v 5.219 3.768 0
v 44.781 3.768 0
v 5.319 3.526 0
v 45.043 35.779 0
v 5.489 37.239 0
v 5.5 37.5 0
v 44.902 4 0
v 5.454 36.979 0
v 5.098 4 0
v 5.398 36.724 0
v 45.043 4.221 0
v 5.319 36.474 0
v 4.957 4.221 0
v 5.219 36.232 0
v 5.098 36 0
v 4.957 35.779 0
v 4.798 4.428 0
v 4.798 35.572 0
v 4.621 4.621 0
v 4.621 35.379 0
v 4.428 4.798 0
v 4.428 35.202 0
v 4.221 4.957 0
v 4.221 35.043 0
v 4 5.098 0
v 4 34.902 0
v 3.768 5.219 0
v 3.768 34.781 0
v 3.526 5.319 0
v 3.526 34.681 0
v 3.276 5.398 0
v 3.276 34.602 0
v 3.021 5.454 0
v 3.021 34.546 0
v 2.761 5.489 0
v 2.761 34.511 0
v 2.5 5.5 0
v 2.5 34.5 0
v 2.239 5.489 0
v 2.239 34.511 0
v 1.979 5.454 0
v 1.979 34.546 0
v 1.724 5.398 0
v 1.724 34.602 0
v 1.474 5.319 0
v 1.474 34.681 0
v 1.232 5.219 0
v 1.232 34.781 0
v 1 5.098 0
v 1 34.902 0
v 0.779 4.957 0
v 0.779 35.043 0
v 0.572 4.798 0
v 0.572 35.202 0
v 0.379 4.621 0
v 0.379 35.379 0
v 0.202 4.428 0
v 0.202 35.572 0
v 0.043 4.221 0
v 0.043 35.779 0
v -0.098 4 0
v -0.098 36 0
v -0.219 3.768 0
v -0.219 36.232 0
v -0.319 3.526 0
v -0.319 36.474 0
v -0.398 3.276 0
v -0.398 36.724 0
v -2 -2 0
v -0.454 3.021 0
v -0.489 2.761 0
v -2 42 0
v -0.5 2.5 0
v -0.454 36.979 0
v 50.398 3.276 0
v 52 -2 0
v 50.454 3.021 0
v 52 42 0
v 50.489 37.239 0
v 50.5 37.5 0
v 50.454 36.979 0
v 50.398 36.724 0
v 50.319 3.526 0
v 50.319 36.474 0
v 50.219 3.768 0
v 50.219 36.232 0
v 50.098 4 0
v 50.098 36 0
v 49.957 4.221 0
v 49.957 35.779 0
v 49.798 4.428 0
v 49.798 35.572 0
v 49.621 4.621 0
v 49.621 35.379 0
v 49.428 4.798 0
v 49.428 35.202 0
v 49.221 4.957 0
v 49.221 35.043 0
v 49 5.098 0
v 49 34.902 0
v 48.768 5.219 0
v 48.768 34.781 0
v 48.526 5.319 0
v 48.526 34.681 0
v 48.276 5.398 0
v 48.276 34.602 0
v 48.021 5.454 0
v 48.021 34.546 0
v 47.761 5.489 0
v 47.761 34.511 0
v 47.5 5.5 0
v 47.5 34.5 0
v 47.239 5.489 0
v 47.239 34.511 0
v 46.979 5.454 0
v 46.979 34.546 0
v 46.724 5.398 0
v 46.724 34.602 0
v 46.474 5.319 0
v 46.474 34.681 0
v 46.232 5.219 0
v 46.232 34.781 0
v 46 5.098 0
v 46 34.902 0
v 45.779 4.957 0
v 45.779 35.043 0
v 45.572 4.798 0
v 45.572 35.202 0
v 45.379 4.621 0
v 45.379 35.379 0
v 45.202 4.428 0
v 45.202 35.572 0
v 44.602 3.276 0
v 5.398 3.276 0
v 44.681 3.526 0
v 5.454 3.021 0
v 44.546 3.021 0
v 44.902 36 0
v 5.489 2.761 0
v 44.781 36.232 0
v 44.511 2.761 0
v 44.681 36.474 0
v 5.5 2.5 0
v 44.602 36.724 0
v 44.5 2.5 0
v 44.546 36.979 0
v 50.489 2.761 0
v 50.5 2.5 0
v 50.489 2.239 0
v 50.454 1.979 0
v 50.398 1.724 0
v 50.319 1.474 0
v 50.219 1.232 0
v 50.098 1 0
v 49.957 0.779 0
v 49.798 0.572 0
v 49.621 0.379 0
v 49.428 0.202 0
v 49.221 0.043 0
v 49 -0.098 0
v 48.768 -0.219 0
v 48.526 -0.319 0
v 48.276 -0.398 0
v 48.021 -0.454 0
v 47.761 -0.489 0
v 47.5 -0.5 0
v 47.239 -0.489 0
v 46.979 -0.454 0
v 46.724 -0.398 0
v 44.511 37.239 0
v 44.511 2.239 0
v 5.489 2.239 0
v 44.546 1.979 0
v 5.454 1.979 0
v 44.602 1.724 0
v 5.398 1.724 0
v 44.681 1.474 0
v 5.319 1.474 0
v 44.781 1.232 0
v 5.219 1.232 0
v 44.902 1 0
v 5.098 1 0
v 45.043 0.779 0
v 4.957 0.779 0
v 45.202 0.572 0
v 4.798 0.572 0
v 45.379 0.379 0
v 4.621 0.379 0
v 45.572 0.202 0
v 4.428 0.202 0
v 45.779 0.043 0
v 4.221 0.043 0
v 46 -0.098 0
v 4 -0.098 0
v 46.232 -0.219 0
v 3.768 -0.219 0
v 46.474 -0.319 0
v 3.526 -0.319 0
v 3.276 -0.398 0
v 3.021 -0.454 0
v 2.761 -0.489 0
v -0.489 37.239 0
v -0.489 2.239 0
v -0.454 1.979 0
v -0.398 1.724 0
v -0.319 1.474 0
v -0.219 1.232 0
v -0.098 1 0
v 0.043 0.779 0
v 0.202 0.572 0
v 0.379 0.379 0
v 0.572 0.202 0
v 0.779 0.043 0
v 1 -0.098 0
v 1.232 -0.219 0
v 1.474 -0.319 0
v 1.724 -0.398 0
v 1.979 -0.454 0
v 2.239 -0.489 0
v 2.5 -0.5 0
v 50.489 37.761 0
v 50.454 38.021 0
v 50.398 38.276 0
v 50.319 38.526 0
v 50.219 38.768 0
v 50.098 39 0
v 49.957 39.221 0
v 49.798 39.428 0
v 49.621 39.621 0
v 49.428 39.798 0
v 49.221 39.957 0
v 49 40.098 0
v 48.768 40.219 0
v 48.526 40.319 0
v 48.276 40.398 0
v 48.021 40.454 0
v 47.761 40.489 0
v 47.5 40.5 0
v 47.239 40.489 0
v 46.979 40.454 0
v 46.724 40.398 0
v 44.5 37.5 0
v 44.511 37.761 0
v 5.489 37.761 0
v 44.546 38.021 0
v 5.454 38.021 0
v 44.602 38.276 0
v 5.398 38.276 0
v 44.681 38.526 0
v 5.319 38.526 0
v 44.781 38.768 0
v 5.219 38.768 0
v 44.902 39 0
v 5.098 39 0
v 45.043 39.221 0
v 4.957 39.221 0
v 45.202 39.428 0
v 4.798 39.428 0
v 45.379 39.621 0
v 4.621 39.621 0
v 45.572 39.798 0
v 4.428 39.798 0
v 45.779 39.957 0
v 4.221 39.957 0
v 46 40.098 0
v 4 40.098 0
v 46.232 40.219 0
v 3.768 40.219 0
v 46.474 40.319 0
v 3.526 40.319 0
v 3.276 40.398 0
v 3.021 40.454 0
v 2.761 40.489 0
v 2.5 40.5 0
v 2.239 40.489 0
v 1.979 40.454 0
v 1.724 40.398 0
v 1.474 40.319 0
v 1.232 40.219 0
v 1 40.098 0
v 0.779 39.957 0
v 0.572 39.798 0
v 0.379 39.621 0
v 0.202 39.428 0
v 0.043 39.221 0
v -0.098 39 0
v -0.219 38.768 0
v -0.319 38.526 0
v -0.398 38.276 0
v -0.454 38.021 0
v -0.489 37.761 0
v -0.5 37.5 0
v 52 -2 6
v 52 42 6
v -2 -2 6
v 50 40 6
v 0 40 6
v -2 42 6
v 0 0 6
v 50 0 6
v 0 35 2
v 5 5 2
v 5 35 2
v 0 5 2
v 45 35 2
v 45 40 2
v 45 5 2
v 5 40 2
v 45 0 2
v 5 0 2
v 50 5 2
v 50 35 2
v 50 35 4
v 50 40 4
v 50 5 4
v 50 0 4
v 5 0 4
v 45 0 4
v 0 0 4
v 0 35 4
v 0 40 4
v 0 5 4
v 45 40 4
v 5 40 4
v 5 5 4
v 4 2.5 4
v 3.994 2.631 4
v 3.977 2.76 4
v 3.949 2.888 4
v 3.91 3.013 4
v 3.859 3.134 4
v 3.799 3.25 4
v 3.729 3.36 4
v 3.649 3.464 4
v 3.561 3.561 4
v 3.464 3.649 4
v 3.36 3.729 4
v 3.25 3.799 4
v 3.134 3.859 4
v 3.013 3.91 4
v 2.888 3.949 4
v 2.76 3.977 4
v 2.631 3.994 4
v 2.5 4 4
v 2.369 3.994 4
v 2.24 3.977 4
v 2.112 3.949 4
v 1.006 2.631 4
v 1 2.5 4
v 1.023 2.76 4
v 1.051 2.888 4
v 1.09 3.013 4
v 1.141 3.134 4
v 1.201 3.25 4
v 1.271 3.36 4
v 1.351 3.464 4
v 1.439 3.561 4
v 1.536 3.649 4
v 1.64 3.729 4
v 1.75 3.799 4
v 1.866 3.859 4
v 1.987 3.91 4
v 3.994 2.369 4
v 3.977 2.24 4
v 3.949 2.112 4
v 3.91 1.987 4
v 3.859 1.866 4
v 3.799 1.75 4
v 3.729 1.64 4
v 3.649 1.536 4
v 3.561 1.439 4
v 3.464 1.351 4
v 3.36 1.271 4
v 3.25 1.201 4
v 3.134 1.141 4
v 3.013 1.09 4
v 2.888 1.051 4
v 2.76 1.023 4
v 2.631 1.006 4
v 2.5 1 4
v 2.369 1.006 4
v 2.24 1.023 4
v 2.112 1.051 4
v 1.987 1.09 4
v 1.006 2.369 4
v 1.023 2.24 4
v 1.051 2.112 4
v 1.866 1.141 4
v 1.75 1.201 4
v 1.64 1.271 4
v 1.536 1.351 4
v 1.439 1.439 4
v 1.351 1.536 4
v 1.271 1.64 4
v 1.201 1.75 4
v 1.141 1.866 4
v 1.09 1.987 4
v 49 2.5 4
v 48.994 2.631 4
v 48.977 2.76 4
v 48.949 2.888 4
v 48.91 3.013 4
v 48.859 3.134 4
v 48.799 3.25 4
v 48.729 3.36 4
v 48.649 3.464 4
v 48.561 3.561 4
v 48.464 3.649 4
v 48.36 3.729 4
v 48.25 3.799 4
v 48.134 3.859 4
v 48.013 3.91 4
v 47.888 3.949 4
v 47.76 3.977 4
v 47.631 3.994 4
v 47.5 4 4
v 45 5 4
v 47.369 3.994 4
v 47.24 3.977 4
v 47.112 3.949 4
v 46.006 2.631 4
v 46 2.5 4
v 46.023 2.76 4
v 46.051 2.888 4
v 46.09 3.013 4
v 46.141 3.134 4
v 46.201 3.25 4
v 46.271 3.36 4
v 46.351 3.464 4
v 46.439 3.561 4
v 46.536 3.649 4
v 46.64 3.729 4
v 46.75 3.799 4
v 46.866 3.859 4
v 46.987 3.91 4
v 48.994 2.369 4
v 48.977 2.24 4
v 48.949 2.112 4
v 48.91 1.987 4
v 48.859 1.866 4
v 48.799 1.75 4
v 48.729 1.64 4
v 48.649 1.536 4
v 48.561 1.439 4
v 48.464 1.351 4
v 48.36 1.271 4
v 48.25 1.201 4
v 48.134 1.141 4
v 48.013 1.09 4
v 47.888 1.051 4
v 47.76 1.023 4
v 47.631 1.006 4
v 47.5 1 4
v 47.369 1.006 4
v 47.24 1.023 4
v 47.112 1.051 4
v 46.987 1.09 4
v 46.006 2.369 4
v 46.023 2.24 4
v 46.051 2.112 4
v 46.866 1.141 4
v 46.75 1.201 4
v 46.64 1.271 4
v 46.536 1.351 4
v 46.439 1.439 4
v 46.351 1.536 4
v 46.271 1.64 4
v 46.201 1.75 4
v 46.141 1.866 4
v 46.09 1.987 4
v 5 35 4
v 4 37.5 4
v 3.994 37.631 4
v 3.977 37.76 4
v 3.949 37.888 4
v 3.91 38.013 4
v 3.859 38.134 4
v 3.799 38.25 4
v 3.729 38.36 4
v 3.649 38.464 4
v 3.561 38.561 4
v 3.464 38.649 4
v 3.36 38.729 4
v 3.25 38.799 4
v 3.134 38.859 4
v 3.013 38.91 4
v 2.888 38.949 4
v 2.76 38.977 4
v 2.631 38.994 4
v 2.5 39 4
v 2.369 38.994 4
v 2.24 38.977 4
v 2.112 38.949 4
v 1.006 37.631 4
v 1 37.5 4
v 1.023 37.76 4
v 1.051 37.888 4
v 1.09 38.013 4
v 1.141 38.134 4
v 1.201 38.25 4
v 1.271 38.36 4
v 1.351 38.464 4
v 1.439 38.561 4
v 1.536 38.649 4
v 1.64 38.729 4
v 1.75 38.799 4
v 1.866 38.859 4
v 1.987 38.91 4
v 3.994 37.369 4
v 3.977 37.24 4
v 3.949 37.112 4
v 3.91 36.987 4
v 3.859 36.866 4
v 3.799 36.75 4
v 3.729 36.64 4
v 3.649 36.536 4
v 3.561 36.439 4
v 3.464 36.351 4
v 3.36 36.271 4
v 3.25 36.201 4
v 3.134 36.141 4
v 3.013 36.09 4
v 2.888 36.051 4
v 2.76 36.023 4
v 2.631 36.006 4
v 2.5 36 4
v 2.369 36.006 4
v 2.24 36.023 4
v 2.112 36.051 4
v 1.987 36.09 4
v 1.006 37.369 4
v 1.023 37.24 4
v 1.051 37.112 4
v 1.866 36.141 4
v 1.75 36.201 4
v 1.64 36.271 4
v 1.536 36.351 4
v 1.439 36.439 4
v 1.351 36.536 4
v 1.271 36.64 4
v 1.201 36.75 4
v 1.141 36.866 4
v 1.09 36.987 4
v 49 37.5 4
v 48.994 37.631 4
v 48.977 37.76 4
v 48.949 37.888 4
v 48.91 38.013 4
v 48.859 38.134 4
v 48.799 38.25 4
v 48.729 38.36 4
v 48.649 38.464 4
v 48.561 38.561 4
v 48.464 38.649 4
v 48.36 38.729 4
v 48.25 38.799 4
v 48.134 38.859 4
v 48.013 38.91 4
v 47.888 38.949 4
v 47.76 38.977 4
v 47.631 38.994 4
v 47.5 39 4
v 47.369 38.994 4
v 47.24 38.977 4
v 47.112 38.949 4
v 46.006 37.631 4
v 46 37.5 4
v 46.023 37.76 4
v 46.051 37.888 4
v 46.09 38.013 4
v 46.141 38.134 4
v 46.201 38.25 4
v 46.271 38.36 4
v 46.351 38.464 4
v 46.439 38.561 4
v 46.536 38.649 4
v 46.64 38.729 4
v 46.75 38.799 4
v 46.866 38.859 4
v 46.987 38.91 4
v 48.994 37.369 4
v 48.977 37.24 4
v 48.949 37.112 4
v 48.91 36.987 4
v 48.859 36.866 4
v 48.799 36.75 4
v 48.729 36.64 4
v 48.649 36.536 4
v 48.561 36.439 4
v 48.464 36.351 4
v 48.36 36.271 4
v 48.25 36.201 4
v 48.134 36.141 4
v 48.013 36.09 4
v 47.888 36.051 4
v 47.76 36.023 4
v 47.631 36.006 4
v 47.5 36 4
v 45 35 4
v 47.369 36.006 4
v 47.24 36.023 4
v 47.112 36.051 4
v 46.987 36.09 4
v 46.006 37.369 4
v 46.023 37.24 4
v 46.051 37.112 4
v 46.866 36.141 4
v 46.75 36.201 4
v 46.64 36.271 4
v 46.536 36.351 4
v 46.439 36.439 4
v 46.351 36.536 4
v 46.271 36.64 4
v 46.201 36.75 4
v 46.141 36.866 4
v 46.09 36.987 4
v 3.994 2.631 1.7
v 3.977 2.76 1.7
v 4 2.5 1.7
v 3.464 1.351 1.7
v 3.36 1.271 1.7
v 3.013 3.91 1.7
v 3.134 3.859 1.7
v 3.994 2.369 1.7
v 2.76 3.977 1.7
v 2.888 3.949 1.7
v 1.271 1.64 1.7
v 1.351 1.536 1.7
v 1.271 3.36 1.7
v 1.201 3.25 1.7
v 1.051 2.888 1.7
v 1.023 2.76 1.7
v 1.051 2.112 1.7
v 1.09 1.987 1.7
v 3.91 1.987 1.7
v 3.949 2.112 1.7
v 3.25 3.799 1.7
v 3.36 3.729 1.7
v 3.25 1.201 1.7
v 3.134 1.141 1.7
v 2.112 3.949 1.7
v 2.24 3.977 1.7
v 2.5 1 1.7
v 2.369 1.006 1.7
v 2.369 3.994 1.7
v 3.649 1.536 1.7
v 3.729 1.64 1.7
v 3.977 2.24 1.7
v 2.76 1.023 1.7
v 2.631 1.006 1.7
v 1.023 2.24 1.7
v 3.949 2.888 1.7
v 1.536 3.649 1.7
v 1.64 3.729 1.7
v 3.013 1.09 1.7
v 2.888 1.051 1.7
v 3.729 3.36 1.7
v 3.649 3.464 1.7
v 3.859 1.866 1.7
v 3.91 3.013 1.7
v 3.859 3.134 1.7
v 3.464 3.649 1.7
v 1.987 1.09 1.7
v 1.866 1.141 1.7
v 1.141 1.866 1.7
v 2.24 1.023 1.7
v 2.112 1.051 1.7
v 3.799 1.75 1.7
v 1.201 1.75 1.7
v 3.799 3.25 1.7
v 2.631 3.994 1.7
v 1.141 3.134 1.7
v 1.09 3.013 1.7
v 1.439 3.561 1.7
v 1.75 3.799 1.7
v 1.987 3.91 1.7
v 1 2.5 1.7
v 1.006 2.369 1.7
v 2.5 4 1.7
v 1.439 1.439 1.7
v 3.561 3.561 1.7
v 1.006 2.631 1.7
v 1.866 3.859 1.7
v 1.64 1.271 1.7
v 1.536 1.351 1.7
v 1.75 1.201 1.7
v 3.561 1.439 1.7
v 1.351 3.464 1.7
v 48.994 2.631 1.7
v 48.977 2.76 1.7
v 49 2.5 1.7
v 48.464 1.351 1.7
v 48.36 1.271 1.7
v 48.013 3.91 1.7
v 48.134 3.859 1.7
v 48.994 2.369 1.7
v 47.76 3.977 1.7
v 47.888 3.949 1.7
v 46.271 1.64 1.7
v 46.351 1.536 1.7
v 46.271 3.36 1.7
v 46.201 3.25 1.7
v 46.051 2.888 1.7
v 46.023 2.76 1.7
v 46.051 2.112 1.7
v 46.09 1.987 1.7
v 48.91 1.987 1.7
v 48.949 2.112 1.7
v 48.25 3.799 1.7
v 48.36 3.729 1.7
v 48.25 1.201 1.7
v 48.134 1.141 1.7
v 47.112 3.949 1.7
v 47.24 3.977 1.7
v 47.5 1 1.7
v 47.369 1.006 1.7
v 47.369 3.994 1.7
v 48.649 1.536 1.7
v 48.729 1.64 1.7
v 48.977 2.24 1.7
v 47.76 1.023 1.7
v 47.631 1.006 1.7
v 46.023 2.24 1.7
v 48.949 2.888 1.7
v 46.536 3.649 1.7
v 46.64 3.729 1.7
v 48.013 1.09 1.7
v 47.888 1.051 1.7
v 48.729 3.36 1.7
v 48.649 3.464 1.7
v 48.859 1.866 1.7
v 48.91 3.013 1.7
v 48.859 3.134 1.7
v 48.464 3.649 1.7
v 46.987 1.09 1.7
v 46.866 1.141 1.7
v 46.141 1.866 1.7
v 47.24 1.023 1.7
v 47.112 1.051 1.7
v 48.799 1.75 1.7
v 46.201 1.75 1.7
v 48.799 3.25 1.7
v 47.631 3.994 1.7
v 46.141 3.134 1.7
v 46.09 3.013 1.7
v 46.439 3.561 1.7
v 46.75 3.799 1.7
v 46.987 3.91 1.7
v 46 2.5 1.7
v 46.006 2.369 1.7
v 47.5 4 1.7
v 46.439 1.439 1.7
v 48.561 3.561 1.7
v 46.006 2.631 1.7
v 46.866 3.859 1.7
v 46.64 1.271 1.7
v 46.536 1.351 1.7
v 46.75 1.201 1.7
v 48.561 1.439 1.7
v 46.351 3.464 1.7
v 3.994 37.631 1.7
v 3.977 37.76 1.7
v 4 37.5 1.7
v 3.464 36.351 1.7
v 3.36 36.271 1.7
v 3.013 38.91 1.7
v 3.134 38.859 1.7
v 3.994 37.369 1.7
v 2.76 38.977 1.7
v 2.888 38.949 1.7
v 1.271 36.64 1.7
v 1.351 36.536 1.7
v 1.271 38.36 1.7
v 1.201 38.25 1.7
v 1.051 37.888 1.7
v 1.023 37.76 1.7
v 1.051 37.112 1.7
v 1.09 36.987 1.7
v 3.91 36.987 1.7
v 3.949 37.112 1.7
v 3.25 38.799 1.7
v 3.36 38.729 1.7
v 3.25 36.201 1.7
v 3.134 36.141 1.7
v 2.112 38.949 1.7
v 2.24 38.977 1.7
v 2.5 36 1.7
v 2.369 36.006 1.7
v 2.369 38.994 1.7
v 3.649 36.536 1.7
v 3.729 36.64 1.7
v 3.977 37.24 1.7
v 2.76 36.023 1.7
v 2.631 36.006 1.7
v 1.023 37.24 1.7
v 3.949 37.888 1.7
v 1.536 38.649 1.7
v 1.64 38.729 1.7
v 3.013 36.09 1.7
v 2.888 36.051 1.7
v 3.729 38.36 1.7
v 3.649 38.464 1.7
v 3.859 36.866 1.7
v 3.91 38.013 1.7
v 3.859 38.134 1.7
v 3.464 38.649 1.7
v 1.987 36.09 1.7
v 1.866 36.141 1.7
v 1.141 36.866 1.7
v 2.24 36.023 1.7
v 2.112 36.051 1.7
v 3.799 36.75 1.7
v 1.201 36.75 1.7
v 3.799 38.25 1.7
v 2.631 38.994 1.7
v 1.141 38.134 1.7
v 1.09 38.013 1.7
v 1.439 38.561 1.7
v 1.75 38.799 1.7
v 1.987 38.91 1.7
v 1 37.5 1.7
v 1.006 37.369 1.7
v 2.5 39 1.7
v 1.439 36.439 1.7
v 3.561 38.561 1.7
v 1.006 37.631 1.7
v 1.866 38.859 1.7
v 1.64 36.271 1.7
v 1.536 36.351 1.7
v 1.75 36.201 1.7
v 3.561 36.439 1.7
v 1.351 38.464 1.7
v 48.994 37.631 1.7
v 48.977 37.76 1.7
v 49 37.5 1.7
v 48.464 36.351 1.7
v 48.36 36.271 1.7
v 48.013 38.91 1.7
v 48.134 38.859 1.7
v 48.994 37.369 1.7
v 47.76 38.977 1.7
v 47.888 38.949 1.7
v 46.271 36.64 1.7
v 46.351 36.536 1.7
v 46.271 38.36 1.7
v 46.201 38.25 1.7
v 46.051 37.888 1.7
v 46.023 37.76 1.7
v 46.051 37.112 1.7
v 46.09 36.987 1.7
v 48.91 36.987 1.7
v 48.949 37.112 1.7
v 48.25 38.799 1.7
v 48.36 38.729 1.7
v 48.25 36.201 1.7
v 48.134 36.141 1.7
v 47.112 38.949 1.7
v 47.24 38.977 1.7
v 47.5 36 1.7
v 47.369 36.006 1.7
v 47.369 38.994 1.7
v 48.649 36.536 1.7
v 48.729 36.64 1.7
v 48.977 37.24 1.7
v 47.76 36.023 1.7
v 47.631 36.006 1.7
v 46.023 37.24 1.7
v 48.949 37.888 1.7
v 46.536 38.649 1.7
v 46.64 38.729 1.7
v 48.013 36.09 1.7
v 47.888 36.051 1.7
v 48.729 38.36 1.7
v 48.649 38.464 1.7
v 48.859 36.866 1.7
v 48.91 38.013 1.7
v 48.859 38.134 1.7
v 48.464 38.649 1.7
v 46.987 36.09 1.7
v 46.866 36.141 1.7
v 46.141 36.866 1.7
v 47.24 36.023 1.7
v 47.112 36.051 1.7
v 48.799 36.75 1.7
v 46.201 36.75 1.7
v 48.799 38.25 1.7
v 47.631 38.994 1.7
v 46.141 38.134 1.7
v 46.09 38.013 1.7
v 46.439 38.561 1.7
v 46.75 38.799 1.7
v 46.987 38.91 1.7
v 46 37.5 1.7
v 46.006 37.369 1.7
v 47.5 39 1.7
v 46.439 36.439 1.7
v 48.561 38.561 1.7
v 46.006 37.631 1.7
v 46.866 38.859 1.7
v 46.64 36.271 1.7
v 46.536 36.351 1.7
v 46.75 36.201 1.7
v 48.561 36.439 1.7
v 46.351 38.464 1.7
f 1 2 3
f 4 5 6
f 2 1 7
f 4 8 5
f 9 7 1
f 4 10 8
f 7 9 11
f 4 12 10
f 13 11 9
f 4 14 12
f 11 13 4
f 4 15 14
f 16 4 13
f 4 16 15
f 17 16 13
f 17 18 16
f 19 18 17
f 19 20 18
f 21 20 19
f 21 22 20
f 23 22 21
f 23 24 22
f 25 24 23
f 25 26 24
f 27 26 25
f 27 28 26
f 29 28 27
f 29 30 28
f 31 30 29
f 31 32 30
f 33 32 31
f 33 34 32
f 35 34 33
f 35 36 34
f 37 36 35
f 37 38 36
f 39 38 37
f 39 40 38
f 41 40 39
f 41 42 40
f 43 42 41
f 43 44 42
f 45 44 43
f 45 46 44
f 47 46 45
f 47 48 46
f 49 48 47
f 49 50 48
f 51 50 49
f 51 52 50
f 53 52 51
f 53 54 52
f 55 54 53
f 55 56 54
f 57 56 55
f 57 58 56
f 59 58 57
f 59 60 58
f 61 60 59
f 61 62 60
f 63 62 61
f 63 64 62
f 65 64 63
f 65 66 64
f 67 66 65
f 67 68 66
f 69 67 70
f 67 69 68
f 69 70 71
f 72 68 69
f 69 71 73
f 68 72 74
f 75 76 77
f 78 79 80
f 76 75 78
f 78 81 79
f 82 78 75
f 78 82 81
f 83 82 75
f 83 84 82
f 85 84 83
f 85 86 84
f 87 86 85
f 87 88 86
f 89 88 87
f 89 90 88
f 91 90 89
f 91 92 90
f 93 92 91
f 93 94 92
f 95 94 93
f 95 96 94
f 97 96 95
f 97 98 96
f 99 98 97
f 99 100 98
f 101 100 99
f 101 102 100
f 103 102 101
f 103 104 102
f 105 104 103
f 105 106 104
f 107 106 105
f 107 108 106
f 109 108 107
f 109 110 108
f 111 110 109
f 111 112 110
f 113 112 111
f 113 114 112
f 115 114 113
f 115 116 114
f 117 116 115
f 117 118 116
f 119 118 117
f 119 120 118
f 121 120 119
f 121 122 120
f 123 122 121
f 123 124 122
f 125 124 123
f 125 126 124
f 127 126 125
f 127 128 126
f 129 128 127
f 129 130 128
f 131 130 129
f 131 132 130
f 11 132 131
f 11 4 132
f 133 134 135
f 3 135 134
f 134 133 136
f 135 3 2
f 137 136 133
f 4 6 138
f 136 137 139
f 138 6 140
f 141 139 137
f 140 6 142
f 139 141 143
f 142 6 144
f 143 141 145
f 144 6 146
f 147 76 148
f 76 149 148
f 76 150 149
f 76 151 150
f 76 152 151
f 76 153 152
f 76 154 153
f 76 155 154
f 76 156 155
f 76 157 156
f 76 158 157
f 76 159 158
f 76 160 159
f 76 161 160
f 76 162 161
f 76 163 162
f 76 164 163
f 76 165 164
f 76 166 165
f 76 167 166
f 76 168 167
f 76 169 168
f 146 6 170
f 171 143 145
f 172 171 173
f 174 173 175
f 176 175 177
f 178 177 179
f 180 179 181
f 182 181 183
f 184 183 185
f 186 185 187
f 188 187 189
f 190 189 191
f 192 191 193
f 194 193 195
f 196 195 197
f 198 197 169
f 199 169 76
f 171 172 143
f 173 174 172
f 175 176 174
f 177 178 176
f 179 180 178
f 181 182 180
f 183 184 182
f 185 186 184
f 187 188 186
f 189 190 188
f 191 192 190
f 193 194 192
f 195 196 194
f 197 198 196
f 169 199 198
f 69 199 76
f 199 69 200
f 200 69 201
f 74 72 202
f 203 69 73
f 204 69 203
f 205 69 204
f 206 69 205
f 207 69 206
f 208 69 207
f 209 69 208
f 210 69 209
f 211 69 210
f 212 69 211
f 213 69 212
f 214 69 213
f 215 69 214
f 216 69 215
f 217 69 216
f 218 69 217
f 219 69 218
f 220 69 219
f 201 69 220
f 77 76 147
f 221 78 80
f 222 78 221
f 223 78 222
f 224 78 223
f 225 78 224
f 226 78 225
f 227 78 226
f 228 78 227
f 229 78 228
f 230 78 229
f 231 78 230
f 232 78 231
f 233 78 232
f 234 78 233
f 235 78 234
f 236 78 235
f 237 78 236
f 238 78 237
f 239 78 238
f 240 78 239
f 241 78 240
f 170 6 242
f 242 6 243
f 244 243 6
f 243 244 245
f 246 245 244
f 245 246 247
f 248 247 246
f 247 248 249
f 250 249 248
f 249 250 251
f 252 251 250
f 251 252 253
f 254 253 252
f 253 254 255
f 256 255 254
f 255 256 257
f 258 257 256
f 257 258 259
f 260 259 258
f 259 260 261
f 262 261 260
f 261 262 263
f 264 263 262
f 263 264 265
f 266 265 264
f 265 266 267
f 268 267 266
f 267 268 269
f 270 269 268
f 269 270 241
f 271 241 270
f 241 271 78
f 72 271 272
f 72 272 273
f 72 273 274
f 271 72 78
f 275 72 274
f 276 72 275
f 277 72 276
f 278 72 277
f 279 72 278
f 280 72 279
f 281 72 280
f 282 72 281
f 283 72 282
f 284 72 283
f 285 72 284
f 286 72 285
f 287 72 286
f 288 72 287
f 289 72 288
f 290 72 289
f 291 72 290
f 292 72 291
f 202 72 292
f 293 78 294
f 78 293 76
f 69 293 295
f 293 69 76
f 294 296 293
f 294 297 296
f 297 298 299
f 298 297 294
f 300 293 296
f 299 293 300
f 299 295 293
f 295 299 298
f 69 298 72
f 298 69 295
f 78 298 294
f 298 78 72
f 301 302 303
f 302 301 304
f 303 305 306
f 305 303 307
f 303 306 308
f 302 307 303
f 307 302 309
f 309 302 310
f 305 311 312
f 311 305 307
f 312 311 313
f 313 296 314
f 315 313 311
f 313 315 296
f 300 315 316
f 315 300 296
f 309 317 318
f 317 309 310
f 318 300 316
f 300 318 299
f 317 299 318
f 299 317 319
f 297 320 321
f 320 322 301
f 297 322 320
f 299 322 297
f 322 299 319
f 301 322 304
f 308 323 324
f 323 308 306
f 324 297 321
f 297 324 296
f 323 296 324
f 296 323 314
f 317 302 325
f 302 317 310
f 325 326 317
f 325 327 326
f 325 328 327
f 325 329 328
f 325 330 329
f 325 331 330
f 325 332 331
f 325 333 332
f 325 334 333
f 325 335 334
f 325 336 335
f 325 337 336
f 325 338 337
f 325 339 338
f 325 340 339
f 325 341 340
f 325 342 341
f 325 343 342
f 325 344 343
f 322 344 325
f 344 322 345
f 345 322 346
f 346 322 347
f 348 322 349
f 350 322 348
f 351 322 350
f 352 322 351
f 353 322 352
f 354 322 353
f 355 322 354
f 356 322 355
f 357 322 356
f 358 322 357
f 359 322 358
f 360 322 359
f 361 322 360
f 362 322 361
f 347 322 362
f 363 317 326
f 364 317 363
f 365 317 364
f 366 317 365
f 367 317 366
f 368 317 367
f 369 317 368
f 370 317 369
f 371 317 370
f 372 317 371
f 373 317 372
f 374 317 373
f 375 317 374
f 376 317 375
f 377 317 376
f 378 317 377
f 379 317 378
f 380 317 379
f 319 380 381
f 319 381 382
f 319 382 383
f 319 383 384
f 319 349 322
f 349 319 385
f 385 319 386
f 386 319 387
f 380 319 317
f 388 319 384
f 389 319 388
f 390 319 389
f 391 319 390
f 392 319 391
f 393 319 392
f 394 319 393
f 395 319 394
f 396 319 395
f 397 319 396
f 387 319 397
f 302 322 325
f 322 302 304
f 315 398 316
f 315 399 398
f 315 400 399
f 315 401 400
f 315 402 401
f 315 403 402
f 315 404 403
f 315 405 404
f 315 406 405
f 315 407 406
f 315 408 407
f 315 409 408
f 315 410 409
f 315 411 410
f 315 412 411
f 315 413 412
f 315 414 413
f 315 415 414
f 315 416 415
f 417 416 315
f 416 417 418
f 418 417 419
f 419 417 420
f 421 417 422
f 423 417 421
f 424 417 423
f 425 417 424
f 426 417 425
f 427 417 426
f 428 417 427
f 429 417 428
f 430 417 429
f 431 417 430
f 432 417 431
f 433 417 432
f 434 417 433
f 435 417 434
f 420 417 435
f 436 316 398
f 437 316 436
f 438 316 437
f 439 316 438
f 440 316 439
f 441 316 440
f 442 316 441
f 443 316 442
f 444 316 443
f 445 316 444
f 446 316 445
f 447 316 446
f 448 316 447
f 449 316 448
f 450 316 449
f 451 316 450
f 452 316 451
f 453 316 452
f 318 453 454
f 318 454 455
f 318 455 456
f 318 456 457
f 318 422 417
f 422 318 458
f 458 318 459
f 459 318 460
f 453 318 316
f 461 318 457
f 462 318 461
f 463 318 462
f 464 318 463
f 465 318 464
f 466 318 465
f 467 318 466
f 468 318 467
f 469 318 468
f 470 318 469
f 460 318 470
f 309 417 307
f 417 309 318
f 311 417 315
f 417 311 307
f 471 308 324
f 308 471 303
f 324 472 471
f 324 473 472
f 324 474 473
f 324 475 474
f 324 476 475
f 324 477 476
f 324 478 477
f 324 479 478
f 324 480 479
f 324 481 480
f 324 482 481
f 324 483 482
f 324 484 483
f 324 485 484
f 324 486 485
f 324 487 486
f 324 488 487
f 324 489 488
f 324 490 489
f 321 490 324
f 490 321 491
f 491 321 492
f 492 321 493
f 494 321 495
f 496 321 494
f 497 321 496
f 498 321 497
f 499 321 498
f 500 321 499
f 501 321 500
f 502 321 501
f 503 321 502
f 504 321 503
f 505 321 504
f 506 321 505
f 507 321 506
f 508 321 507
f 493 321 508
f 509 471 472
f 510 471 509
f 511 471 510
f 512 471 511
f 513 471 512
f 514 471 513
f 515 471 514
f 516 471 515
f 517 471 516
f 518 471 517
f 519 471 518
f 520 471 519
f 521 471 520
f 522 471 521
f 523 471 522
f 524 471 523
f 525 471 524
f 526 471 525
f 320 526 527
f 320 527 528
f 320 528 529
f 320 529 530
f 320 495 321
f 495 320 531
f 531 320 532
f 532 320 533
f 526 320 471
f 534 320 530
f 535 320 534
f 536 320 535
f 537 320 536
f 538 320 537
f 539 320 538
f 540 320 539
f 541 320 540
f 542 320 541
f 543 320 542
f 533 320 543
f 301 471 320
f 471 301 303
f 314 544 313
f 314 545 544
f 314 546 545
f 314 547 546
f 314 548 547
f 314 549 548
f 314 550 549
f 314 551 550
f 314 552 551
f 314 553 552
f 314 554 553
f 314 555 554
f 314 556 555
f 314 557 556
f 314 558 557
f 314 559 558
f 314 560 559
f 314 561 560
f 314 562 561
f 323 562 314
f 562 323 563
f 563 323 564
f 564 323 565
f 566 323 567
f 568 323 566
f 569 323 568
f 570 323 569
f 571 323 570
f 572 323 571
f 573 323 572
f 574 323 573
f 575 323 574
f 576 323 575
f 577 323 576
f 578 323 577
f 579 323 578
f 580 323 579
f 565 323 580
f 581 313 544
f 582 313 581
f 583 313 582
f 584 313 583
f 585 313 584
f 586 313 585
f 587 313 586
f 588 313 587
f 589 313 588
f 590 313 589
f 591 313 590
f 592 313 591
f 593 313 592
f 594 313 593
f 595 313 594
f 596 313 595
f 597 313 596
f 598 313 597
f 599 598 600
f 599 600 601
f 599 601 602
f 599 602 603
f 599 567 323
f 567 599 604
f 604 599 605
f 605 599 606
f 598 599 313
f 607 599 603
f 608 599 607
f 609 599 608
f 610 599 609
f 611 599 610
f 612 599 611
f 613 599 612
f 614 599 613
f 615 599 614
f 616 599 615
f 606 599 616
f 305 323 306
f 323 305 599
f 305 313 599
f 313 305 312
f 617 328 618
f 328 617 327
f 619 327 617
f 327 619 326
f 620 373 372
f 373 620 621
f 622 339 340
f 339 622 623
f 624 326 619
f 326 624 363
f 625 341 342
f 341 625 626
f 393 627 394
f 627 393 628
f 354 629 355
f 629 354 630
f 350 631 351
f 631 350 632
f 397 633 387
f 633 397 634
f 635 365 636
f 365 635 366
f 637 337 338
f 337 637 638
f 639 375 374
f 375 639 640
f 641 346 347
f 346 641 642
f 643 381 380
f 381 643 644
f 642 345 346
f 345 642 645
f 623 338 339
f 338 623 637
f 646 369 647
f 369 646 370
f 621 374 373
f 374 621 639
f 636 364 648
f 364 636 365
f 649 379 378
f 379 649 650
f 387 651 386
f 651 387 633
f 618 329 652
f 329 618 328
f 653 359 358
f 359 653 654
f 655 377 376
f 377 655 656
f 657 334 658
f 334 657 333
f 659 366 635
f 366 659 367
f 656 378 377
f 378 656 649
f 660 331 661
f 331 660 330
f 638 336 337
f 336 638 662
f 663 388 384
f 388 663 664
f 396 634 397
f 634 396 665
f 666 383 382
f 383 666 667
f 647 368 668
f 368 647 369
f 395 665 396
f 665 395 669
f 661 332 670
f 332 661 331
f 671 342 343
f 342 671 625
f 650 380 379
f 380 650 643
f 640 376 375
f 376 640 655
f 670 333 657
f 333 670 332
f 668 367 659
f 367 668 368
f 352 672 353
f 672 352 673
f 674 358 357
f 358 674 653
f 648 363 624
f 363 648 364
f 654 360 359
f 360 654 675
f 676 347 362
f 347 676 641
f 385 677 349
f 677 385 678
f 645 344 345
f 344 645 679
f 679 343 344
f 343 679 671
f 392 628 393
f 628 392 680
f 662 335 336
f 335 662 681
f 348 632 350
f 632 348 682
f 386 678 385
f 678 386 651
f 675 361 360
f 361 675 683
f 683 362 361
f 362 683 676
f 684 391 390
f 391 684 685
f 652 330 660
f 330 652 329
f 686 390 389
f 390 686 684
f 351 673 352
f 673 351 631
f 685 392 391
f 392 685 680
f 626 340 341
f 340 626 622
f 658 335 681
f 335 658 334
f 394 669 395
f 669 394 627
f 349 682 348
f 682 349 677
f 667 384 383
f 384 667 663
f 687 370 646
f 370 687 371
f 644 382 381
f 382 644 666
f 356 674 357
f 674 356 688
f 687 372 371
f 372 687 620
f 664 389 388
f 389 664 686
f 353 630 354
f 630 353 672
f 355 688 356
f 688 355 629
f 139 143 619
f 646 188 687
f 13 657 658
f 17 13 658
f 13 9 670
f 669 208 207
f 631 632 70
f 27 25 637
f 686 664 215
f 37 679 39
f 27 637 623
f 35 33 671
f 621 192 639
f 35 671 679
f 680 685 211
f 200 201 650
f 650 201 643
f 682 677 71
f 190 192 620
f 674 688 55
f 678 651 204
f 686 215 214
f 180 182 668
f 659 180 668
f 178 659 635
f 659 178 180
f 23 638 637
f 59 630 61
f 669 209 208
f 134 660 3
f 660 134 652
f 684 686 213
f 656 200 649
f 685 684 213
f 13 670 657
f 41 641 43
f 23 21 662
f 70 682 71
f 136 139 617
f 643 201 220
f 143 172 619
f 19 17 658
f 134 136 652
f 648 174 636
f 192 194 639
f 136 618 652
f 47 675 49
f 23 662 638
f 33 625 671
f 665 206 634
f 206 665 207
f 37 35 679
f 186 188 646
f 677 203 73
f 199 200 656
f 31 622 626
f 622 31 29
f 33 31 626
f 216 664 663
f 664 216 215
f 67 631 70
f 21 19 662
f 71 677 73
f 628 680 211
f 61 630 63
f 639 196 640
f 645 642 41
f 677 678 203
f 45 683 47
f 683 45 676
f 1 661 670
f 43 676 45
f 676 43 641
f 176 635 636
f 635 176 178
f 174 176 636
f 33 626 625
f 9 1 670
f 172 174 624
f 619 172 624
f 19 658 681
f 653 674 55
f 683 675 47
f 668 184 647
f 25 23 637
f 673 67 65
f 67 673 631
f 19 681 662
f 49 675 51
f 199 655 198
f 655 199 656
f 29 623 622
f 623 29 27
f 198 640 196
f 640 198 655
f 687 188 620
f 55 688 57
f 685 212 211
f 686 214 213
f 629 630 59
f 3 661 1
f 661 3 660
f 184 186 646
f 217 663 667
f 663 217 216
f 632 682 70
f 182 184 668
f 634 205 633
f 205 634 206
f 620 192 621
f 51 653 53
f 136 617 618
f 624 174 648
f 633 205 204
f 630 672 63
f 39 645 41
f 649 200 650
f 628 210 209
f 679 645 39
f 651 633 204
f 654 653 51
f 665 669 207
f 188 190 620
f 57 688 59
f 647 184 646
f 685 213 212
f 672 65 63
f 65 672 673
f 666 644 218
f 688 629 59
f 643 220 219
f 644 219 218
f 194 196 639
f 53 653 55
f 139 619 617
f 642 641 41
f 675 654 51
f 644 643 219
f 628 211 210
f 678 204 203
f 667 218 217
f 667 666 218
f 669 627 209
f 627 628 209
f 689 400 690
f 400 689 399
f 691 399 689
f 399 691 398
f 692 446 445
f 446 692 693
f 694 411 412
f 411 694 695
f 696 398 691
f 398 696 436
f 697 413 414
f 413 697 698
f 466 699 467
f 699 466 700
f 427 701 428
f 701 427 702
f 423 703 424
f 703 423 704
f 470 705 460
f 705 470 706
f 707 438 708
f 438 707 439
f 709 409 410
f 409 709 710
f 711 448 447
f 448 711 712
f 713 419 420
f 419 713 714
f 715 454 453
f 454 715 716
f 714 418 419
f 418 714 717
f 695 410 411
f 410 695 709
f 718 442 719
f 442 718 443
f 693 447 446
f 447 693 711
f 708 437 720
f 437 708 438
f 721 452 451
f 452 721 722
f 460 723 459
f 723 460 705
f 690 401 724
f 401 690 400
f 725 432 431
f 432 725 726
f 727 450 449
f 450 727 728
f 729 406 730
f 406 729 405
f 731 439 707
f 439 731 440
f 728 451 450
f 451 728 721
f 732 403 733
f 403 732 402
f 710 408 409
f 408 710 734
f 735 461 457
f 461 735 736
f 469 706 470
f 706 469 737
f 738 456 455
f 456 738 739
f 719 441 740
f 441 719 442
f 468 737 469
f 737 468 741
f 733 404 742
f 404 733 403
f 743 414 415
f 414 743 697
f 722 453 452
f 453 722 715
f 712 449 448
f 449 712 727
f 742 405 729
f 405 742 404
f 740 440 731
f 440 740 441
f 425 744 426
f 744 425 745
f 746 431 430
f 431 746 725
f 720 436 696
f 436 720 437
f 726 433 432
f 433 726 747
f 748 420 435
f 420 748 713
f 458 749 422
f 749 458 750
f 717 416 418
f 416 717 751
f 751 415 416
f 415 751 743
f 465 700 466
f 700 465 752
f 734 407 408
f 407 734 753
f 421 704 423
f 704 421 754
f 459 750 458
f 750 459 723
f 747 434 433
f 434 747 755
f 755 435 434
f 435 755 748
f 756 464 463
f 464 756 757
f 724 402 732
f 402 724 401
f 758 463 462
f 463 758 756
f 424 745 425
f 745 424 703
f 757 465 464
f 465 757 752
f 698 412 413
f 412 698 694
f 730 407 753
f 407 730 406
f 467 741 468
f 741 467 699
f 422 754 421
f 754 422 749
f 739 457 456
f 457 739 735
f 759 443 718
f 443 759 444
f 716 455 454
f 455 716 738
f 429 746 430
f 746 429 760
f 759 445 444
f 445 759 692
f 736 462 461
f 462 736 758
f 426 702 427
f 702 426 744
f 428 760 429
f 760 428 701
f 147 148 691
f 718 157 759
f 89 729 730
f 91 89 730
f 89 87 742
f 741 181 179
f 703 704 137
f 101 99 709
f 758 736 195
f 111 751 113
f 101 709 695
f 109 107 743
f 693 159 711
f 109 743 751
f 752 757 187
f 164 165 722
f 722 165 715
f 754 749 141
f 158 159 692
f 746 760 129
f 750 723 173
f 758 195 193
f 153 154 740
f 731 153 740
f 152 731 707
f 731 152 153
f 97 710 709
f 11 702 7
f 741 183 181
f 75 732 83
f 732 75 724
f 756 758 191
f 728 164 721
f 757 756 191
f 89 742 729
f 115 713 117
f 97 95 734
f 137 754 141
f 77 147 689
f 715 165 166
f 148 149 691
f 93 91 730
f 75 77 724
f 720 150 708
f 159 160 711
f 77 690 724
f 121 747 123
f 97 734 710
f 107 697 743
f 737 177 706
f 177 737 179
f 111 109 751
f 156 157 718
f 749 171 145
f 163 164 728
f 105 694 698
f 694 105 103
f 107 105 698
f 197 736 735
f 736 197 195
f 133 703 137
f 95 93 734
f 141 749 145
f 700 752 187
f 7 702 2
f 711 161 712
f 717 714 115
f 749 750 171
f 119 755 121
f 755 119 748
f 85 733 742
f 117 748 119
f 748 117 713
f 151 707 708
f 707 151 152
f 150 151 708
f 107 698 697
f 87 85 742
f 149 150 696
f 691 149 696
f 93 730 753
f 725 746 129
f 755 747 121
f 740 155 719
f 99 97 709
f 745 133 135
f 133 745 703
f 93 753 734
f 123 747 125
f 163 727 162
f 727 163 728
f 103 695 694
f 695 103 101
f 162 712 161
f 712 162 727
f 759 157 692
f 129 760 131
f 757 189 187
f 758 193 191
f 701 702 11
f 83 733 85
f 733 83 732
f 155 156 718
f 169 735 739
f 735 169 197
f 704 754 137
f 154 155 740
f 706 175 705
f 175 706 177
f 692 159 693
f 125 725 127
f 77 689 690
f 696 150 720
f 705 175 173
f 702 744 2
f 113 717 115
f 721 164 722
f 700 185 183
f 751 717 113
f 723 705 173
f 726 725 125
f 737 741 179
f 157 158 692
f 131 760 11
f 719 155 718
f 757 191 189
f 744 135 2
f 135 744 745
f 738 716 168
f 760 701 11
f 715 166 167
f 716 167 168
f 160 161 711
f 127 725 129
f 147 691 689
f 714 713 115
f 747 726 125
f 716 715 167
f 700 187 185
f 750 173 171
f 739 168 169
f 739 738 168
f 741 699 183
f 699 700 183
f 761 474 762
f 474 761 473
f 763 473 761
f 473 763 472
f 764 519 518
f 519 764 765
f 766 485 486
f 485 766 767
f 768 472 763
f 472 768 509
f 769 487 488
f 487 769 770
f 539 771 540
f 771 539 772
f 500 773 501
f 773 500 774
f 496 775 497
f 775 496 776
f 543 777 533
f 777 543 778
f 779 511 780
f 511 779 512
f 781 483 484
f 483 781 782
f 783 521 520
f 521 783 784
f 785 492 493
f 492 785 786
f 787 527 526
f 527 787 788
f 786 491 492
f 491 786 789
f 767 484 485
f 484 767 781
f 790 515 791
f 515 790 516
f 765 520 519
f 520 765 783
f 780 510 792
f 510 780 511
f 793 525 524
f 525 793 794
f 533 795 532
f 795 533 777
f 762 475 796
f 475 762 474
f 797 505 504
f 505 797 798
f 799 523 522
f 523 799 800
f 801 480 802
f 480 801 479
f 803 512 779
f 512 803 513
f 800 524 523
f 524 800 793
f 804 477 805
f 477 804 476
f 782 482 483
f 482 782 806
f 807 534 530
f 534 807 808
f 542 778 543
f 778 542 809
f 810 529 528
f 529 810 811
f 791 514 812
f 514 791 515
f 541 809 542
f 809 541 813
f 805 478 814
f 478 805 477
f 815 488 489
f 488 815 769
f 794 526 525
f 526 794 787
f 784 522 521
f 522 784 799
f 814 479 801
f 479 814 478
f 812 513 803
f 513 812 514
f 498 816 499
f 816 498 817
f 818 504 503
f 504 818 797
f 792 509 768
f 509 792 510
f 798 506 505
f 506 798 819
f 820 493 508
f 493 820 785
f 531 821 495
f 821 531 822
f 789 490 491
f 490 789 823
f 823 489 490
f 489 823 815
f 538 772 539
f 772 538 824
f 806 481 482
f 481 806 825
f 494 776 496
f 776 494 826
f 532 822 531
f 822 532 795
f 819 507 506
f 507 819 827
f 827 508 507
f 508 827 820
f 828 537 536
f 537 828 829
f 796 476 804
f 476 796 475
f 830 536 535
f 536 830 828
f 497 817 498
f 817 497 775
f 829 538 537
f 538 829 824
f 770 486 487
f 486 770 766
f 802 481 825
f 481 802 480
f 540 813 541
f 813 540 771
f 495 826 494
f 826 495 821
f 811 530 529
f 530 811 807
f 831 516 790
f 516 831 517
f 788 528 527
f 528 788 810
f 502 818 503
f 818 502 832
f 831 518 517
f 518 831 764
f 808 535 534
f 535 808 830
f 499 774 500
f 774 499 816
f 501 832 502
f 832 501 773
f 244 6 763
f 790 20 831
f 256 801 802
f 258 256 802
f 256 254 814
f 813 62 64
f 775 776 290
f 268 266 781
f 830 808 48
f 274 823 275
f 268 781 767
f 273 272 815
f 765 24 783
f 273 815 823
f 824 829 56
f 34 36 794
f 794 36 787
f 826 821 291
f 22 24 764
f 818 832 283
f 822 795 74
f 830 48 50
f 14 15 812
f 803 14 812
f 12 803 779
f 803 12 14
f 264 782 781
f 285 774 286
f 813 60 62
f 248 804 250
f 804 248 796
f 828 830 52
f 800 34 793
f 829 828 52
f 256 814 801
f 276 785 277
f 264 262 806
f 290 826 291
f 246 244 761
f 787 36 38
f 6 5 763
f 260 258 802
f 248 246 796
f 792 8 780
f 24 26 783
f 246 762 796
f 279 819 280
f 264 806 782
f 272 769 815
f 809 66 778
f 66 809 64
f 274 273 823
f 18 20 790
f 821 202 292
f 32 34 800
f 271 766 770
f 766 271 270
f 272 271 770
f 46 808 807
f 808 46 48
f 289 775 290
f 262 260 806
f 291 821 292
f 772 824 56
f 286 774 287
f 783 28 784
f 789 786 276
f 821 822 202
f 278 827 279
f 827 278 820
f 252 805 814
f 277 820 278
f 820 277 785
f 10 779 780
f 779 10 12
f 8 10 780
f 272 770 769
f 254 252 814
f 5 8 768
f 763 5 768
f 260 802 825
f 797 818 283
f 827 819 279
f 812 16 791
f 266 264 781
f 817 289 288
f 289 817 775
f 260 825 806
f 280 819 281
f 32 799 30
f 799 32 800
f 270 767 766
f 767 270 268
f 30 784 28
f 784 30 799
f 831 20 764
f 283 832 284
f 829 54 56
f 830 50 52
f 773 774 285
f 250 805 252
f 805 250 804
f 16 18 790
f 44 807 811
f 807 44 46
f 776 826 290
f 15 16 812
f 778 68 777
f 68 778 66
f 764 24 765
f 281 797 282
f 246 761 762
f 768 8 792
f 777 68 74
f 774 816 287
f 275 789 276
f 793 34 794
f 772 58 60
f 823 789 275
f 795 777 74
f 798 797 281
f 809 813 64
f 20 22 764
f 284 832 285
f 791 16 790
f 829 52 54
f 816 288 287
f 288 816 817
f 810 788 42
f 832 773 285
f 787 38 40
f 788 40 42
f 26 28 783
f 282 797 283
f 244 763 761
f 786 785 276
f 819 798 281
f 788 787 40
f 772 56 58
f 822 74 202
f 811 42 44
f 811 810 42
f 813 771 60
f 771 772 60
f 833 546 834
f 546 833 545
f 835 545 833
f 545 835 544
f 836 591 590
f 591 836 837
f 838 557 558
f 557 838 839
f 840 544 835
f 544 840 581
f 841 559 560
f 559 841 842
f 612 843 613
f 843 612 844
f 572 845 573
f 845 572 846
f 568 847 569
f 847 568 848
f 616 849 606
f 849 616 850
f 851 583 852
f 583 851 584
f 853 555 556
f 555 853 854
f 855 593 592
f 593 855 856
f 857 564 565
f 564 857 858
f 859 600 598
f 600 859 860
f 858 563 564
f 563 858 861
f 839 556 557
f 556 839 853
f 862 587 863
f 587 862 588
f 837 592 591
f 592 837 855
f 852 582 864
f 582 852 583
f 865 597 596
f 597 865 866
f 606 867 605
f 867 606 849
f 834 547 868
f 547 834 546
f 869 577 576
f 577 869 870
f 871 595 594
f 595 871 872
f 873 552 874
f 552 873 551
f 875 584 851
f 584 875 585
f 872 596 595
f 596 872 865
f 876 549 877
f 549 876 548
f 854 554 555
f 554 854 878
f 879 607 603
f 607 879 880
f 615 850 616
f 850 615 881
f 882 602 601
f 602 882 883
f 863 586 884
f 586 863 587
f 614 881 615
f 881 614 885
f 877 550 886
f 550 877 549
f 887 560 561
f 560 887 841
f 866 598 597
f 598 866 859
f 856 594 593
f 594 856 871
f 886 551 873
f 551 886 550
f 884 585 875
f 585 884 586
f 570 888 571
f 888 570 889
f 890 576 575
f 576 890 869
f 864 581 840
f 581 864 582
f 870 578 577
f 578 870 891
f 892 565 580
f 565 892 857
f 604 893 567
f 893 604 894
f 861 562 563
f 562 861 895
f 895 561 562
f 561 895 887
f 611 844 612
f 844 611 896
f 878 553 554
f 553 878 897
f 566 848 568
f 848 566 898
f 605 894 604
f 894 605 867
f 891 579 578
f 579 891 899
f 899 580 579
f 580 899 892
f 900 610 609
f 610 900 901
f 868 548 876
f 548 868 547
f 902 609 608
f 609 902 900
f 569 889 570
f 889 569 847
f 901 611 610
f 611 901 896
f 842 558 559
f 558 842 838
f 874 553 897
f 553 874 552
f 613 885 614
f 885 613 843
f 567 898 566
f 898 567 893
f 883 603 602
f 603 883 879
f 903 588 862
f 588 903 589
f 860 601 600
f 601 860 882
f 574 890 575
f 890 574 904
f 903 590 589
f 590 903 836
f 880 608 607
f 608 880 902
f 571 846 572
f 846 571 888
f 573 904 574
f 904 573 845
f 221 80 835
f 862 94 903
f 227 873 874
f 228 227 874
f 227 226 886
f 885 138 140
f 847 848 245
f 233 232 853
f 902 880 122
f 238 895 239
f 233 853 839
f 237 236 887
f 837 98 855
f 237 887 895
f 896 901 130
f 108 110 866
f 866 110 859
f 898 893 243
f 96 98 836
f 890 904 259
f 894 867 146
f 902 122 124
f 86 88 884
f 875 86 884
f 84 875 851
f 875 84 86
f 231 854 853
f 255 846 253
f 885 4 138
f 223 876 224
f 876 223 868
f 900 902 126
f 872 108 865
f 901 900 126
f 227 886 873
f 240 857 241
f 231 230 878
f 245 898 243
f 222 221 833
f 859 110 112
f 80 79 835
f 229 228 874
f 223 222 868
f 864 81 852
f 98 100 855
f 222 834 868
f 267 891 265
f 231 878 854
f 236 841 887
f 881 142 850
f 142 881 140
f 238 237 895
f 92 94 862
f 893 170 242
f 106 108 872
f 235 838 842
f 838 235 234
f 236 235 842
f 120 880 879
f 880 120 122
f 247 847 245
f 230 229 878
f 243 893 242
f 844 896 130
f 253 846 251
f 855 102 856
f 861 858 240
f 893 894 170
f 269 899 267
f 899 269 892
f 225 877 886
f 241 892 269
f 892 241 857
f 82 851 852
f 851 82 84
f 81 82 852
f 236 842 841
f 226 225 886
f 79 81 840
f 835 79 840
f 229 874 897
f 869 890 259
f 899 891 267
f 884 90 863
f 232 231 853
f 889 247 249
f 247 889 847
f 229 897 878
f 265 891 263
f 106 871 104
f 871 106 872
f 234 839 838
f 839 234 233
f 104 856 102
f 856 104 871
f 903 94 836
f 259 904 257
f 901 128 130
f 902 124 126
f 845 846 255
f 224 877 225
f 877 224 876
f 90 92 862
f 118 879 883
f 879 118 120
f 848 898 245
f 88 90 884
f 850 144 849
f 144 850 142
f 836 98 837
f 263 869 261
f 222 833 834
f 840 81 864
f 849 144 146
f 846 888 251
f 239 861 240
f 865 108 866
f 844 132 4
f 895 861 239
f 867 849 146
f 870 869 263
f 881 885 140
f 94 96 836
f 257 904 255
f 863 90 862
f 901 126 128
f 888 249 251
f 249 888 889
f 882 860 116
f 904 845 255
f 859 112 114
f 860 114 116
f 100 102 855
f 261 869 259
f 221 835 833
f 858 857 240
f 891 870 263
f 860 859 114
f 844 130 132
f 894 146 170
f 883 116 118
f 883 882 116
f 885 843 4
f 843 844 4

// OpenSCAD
CASE_THICKNESS = 2;

CASE_INNER_WIDTH = 50;
CASE_INNER_DEPTH = 40;

SPACE_BELOW_PCB = 2.4;
PCB_THICKNESS = 1.6;
POWER_CONNECTOR_HEIGHT = 0;
POWER_CONNECTORS_OPENING_WIDTH = 20;

PCB_TOP_Y       = CASE_THICKNESS + SPACE_BELOW_PCB + PCB_THICKNESS;
CASE_HEIGHT     = PCB_TOP_Y + POWER_CONNECTOR_HEIGHT;
STANDOFF_HEIGHT = PCB_THICKNESS + SPACE_BELOW_PCB;

M3_SCREW_SUNK_DEPTH = 1.7;
M3_SCREW_HEAD_DIAMETER = 6;
M3_SCREW_DIAMETER = 3;


module outer_shape() {
  linear_extrude(height = CASE_HEIGHT)
  polygon(
    [
      [0                - CASE_THICKNESS, 0                - CASE_THICKNESS],
      [CASE_INNER_WIDTH + CASE_THICKNESS, 0                - CASE_THICKNESS],
      [0                - CASE_THICKNESS, CASE_INNER_DEPTH + CASE_THICKNESS],
      [CASE_INNER_WIDTH + CASE_THICKNESS, CASE_INNER_DEPTH + CASE_THICKNESS],
    ],
    [
      [0, 1, 3, 2],  
    ]
  );
}

module inner_space() {
  translate([0,0,CASE_THICKNESS])
  linear_extrude(height = CASE_HEIGHT)
  polygon(
    [
      [0,                0],
      [CASE_INNER_WIDTH, 0],
      [0,                CASE_INNER_DEPTH],
      [CASE_INNER_WIDTH, CASE_INNER_DEPTH],
    ],
    [
      [0, 1, 3, 2],  
    ]
  );
}

module power_connectors_opening(height) {    
    translate([0, 0, height/2])
    cube([POWER_CONNECTORS_OPENING_WIDTH, CASE_THICKNESS, height], center=true);
}

module standoff(height) {
    translate([0, 0, height/2])
    cube([5, 5, height], center= true);
}

module standoff_hole(height) {
    
    union() {
        translate([0, 0, height/2]) cylinder(r=M3_SCREW_DIAMETER/2, h=height,center=true, $fn=72);
       
        translate([0, 0, M3_SCREW_SUNK_DEPTH/2]) cylinder(
            h = M3_SCREW_SUNK_DEPTH,
            r1 = M3_SCREW_HEAD_DIAMETER/2,
            r2 = M3_SCREW_DIAMETER/2,
            center = true,
            $fn=72
        );
    }
}

module case_base() {
    difference() {
        outer_shape();
        inner_space();
    }
}

module standoffs() {
        translate([2.5,                    2.5,                    0]) standoff(STANDOFF_HEIGHT);
        translate([CASE_INNER_WIDTH - 2.5, 2.5,                    0]) standoff(STANDOFF_HEIGHT);
        translate([2.5,                    CASE_INNER_DEPTH - 2.5, 0]) standoff(STANDOFF_HEIGHT);
        translate([CASE_INNER_WIDTH - 2.5, CASE_INNER_DEPTH - 2.5, 0]) standoff(STANDOFF_HEIGHT);    
}

module standoffs_holes() {
        translate([2.5,                    2.5,                    0]) standoff_hole(STANDOFF_HEIGHT);
        translate([CASE_INNER_WIDTH - 2.5, 2.5,                    0]) standoff_hole(STANDOFF_HEIGHT);
        translate([2.5,                    CASE_INNER_DEPTH - 2.5, 0]) standoff_hole(STANDOFF_HEIGHT);
        translate([CASE_INNER_WIDTH - 2.5, CASE_INNER_DEPTH- 2.5,  0]) standoff_hole(STANDOFF_HEIGHT);
}

difference() {    
    union() { case_base(); standoffs(); }    
    union() {
        standoffs_holes();
        
        translate([25, -CASE_THICKNESS/2, PCB_TOP_Y]) power_connectors_opening(CASE_HEIGHT - PCB_TOP_Y);
    }
}
